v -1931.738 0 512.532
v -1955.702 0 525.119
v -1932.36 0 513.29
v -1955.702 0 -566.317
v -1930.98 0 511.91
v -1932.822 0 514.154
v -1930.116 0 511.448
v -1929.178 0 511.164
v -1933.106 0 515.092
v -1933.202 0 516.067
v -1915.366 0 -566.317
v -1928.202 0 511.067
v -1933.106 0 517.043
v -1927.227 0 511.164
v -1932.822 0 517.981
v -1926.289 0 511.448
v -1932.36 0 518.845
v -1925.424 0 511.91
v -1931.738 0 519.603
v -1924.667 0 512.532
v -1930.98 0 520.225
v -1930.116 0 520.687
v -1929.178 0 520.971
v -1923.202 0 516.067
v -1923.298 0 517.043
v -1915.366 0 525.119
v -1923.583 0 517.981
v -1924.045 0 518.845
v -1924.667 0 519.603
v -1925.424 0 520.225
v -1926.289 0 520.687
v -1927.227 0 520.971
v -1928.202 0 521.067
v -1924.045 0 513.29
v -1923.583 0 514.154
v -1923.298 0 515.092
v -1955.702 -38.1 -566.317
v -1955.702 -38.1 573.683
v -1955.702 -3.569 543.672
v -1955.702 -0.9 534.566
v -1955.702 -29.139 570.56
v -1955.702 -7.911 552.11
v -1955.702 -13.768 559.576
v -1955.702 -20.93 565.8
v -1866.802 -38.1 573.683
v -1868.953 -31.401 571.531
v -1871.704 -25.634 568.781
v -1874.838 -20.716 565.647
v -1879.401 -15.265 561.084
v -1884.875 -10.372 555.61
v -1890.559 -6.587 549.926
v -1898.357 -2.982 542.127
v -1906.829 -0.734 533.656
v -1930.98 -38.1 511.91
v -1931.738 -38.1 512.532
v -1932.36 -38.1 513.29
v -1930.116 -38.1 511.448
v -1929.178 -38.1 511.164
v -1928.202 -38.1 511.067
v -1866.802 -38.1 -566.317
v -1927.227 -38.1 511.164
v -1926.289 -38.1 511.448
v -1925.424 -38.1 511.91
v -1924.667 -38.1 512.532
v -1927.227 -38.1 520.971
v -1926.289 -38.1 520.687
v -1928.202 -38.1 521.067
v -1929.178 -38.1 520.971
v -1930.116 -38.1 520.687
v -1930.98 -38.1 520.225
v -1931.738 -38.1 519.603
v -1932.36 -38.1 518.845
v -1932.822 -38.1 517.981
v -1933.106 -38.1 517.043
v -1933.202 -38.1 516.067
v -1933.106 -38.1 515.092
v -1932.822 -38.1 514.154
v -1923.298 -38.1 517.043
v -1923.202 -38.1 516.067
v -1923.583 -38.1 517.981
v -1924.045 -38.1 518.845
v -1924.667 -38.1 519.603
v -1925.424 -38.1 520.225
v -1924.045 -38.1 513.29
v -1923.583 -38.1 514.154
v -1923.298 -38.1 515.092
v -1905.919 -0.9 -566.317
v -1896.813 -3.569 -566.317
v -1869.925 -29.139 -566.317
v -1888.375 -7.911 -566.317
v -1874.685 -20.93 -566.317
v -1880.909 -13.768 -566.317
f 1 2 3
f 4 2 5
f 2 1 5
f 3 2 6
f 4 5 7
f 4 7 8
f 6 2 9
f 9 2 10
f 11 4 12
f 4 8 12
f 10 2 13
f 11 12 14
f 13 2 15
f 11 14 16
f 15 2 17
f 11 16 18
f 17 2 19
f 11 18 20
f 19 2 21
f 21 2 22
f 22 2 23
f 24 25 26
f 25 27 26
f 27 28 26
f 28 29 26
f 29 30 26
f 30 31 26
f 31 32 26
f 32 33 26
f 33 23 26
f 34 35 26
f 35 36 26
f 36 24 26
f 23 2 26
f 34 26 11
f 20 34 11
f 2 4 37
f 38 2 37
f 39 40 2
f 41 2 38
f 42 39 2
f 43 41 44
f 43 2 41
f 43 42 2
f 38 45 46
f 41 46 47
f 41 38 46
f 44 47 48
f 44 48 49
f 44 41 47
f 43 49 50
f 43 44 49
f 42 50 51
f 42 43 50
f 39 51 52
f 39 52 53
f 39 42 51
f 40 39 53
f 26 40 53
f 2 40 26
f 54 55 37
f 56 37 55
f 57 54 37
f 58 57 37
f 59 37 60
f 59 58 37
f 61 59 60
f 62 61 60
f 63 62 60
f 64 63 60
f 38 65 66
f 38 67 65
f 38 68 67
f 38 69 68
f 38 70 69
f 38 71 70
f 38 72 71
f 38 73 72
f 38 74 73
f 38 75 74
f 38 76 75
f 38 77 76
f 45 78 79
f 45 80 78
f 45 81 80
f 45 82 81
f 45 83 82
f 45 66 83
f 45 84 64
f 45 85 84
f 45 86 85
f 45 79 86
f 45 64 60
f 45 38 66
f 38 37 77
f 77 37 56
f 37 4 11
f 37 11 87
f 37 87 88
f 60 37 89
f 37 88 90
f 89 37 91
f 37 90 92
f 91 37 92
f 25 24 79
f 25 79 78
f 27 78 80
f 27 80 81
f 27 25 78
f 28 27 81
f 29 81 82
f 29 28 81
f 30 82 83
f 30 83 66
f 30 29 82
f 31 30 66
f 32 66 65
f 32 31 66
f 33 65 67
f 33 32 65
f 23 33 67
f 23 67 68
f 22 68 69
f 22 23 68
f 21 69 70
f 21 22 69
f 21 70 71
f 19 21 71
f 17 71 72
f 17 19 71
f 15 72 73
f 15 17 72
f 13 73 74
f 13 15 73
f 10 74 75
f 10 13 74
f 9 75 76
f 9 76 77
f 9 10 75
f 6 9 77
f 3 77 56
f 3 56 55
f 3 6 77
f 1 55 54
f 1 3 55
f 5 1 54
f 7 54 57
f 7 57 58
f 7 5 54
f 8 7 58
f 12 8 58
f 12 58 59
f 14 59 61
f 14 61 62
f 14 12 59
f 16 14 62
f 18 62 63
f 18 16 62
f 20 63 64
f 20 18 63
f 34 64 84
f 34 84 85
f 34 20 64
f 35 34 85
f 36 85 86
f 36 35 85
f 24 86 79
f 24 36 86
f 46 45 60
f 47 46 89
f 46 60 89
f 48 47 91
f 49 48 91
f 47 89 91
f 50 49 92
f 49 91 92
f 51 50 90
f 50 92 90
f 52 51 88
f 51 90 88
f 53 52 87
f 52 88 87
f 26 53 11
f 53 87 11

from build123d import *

# Parameters (mm, degrees)
F0_W        = 88.9
F0_H        = 1140
F0_R        = 5
F1_DEPTH    = 38.1
F2_T1_DEPTH = 1382.8162885805
F2_T3_DEPTH = 331.7162885805


# Not quite as in the source:
# - a fillet or chamfer that OpenCascade refuses, or shapes differently, is made with other operations: its cross-section is extruded or revolved along the edge and cut away or added


with BuildPart() as f1:
    # F0 (on Front) → F1 (new body)
    with BuildSketch(Plane.XZ):
        with Locations((-1911.2522443051, 3.6825537682)):
            Rectangle(F0_W, F0_H)
        with Locations((-1928.2022443051, 516.0674452782)):
            Circle(F0_R, mode=Mode.SUBTRACT)
    extrude(amount=F1_DEPTH)

    # F2: fillet of radius 50 on 2 edges, made by hand

    # F2_s2 → F2_t1 (cut)
    with BuildSketch(Plane.XY.offset(-687.7255905221)):
        with BuildLine():
            ThreePointArc((-1866.8022443051, -38.1), (-1884.5029032971, -10.6617234745), (-1915.3655020212, 0))
            Line((-1915.3655020212, 0), (-1866.8022443051, 0))
            Line((-1866.8022443051, 0), (-1866.8022443051, -38.1))
        make_face()
    extrude(amount=F2_T1_DEPTH, mode=Mode.SUBTRACT)

    # F2_s4 → F2_t3 (cut)
    with BuildSketch(Plane.YZ.offset(-2077.1103885953)):
        with BuildLine():
            ThreePointArc((-38.1, 573.6825537682), (-10.6617234745, 555.9818947761), (0, 525.1192960521))
            Line((0, 525.1192960521), (0, 573.6825537682))
            Line((0, 573.6825537682), (-38.1, 573.6825537682))
        make_face()
    extrude(amount=F2_T3_DEPTH, mode=Mode.SUBTRACT)


solid = f1.part
